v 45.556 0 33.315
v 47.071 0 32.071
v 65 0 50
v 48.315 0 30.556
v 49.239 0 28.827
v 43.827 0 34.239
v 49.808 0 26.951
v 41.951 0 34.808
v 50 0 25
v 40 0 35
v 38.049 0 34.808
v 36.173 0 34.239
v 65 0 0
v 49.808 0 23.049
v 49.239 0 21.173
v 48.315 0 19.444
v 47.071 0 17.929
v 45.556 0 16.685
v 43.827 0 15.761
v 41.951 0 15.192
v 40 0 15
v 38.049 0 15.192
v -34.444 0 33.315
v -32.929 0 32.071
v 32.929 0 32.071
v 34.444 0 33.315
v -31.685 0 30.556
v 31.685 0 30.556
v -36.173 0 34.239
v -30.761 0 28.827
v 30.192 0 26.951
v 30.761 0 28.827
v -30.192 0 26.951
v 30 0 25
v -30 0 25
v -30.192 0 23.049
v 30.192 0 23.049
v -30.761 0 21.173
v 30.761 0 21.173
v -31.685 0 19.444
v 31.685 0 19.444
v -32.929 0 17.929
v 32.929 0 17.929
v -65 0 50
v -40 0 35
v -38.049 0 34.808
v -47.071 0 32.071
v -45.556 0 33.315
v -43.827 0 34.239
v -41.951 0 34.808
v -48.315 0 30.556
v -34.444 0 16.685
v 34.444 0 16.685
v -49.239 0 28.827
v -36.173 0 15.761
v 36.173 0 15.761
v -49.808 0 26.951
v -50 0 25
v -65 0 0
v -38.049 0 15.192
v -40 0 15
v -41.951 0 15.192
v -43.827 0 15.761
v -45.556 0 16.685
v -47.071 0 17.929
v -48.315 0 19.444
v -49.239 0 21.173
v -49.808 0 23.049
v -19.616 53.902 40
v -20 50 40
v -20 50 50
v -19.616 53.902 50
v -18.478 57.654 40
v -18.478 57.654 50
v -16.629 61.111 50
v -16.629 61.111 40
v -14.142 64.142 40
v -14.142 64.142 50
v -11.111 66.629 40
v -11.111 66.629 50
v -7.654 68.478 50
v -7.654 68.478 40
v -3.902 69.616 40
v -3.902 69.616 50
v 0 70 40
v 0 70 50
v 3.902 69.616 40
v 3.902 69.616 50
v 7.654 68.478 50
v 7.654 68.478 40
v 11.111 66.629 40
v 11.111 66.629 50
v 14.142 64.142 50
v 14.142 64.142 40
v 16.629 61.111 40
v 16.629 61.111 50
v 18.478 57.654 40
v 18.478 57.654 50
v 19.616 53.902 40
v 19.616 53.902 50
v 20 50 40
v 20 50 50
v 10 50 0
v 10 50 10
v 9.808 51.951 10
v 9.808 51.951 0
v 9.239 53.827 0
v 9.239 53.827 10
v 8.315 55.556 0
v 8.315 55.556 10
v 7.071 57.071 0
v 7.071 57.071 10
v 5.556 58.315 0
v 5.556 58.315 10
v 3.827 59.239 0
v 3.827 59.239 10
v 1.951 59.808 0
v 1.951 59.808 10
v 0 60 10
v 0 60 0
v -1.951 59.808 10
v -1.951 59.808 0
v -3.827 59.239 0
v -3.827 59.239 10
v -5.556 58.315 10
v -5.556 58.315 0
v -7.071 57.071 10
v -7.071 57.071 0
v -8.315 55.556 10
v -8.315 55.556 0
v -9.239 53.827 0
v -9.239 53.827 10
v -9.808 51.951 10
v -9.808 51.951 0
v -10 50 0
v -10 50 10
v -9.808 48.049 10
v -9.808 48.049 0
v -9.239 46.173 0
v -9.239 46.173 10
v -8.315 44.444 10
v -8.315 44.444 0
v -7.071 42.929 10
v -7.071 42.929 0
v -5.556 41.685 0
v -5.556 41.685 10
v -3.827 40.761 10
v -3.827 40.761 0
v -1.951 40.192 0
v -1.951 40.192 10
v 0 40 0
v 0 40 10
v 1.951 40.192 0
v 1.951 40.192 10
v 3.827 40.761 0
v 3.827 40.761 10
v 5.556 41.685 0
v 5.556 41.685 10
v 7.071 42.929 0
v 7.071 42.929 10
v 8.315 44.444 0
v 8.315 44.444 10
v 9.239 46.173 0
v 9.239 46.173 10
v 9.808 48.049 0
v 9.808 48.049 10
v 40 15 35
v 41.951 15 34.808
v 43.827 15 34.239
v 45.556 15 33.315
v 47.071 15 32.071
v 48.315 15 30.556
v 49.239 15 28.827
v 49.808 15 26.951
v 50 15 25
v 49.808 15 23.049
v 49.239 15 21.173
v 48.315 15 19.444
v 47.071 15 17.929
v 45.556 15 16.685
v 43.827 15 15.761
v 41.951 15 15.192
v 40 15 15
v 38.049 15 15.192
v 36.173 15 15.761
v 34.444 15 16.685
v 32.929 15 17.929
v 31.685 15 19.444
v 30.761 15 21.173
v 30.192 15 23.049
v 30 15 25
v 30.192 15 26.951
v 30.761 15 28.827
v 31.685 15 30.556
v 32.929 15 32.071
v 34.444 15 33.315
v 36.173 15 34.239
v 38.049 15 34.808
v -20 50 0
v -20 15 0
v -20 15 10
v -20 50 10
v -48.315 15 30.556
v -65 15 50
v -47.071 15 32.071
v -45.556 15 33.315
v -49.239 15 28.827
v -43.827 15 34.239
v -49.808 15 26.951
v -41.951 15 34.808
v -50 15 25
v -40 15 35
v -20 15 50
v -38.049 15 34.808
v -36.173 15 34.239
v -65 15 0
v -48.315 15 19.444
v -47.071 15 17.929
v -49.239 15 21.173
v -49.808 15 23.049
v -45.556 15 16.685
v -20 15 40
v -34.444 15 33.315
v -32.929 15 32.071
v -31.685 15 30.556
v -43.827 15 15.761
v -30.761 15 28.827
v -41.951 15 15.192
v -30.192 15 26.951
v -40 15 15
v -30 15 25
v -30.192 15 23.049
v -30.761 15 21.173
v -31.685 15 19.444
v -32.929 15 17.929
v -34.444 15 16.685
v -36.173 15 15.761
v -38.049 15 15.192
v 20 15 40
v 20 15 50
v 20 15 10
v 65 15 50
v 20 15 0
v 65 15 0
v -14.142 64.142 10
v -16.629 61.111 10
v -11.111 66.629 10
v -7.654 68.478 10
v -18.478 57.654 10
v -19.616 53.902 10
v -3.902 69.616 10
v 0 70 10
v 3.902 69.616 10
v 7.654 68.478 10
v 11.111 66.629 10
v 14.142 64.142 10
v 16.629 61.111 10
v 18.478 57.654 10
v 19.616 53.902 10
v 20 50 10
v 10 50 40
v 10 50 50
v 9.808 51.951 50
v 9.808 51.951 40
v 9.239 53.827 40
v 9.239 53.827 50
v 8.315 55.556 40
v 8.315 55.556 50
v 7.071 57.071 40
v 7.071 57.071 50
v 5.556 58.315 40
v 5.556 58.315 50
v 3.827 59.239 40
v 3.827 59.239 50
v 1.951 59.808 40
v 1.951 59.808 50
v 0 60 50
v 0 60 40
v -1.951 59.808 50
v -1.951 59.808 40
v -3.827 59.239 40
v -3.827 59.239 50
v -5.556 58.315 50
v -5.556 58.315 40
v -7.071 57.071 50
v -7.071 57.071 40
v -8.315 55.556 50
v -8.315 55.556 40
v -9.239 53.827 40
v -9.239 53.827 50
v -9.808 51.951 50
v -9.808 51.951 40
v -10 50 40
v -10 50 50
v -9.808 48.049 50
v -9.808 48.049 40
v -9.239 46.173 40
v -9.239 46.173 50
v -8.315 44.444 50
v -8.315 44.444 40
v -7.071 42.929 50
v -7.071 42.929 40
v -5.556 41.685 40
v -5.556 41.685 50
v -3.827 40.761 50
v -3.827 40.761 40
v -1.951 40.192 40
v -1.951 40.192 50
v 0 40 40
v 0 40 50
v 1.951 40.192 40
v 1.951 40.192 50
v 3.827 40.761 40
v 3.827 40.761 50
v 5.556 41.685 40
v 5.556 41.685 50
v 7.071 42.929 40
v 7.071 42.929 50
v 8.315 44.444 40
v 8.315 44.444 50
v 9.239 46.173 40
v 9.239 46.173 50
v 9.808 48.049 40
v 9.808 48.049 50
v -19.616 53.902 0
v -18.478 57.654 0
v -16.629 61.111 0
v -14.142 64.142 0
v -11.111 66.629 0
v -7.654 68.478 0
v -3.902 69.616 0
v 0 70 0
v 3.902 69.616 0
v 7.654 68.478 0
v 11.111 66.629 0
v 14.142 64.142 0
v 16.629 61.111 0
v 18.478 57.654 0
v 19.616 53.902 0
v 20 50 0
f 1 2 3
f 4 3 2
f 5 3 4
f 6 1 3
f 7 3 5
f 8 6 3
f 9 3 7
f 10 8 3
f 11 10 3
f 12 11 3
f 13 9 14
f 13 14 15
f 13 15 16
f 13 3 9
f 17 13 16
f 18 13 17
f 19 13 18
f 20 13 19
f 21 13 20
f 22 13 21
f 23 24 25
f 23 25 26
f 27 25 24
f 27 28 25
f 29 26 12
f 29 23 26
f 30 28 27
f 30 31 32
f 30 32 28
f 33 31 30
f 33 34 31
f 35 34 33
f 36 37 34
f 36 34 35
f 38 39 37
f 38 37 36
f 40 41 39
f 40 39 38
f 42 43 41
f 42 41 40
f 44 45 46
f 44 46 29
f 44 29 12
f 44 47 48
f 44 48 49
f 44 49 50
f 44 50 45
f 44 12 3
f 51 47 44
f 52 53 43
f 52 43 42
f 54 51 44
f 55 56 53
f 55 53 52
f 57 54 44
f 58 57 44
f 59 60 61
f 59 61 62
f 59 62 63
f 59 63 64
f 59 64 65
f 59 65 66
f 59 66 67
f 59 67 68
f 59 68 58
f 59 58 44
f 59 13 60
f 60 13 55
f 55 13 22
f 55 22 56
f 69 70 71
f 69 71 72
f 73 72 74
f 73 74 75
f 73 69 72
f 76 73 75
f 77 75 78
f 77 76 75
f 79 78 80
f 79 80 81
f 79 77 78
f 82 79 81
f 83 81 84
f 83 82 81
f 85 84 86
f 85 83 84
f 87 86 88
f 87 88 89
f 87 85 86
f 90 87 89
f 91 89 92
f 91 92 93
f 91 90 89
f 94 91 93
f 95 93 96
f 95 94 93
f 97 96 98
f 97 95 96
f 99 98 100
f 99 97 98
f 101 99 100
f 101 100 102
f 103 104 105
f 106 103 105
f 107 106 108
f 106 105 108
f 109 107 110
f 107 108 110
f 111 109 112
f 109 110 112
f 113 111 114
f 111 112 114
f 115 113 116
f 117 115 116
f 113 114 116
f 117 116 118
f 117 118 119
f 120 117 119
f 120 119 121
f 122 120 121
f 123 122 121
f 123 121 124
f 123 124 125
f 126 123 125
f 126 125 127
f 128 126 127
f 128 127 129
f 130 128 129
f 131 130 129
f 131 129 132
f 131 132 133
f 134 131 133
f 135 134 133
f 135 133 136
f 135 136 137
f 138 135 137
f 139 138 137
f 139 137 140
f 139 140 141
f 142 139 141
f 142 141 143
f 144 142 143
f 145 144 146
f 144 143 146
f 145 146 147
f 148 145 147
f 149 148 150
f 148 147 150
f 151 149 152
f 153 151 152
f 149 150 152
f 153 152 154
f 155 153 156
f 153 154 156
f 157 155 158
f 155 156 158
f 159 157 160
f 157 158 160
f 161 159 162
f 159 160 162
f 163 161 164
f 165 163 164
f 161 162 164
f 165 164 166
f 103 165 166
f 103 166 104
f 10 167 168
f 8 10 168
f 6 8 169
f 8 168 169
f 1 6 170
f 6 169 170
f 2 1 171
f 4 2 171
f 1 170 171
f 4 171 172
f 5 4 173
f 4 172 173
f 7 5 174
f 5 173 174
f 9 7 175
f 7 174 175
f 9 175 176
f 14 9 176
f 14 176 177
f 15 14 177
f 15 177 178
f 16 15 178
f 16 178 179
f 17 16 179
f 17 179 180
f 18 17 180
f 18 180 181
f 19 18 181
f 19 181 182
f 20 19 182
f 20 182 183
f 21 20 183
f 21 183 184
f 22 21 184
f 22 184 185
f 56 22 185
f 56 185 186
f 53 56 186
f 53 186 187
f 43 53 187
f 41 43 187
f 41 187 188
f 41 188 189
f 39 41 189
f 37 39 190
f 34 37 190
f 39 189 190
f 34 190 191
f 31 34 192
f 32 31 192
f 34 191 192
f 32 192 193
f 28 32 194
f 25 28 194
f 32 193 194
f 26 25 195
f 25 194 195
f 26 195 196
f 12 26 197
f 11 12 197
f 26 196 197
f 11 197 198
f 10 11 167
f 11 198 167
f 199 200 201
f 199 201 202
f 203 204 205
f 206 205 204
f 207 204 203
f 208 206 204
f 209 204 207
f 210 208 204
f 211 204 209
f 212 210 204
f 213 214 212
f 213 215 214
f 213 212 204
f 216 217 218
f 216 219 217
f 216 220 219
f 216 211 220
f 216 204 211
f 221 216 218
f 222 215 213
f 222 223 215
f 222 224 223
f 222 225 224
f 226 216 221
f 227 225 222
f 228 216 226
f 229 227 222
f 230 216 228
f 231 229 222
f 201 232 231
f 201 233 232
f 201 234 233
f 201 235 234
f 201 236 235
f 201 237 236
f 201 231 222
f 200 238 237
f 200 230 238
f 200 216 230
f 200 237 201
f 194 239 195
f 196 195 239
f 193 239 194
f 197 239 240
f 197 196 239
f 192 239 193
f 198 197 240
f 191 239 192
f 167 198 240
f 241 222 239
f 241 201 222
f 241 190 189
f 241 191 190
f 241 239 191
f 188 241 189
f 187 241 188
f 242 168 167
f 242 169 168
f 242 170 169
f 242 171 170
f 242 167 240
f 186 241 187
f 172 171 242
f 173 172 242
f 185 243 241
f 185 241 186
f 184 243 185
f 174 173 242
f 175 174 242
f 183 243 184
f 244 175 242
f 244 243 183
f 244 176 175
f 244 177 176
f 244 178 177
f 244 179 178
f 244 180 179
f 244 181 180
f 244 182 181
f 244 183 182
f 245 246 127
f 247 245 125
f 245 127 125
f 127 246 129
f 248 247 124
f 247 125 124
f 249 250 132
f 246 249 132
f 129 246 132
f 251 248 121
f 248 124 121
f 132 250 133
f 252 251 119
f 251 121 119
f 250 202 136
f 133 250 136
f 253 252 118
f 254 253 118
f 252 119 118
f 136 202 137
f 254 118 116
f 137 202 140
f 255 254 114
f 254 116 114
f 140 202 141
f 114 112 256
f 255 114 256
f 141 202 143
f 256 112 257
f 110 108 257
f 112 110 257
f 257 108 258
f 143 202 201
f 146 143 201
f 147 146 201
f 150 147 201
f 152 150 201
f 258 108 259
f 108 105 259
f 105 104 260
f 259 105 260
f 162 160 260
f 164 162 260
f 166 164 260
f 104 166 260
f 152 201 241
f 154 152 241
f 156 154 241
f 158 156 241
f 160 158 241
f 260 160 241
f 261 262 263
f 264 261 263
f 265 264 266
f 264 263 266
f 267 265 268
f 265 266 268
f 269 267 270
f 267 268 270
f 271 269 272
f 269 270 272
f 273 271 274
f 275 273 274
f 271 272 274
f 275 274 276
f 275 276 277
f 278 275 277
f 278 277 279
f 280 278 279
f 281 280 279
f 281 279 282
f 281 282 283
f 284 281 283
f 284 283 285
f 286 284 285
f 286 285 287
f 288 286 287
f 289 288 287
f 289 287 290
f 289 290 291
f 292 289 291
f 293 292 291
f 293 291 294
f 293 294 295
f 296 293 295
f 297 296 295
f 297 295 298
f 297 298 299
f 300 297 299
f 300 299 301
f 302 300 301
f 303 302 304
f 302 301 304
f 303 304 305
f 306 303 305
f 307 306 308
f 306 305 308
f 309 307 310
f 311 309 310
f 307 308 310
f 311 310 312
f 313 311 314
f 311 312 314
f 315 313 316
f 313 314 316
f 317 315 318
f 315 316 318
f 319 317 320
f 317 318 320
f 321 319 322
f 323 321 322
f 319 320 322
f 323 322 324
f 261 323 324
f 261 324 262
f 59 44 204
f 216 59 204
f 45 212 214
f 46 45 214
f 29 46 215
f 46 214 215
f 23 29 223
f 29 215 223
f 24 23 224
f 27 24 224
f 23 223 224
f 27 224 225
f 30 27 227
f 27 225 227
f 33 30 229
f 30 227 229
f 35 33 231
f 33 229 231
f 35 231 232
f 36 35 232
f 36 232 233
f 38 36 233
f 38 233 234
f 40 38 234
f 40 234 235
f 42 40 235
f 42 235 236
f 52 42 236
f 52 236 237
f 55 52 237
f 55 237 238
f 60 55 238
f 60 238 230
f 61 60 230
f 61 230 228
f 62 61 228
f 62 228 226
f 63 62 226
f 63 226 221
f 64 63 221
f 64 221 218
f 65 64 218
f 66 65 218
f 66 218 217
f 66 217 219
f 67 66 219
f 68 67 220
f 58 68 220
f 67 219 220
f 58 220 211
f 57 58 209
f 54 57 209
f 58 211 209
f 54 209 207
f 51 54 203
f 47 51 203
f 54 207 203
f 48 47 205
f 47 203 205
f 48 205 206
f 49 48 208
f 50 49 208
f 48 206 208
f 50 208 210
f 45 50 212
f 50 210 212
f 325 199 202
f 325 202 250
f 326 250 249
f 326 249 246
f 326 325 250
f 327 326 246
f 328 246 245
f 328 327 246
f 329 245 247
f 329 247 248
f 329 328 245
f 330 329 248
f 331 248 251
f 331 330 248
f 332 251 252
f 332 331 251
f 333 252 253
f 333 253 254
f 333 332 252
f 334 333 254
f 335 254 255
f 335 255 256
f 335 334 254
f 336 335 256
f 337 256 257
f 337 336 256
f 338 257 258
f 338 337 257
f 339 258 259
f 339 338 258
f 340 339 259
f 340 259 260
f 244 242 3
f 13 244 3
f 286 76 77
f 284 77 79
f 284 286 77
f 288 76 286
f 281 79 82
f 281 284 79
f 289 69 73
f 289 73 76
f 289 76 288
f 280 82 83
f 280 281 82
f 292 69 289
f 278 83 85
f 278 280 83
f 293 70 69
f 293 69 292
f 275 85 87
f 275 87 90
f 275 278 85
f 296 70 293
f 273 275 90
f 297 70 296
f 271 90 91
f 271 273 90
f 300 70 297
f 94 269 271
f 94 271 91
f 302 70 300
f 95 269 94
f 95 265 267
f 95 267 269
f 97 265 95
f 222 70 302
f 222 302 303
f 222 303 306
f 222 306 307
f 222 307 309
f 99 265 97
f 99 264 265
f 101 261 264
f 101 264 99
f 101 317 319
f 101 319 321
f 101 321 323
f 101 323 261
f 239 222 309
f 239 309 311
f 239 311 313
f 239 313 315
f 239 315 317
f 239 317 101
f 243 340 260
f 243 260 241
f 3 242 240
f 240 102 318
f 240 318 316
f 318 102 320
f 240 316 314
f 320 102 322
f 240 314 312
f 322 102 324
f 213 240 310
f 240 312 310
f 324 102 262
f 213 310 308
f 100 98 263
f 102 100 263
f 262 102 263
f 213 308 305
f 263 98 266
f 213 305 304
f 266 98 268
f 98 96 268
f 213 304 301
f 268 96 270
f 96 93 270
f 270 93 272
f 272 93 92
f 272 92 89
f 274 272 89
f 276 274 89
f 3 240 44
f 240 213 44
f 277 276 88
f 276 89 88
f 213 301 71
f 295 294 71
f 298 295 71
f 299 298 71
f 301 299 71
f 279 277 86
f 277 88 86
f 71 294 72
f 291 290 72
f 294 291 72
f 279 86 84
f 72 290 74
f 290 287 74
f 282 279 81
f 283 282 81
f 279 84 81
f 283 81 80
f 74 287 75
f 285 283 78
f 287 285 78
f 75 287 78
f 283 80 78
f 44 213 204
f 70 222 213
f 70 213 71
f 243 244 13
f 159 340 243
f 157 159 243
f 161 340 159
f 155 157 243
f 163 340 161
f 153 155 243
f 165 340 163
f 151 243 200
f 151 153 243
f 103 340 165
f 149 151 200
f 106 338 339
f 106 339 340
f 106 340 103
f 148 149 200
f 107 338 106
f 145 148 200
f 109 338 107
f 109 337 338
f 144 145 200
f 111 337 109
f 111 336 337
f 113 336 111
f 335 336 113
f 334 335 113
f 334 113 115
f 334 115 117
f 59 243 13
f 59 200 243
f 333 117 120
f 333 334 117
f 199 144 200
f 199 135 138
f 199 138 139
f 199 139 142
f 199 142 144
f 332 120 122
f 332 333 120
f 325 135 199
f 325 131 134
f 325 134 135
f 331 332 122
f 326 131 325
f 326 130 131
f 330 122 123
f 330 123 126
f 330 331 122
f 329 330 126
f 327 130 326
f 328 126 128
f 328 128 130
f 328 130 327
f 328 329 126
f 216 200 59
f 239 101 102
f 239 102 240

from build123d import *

# Parameters (mm, degrees)
BOSS_EXTRUDE1_DEPTH = 50
SKETCH2_R           = 10
CUT_EXTRUDE1_DEPTH  = 25
SKETCH2_3_R         = 10
CUT_EXTRUDE2_DEPTH  = 25
SKETCH3_W           = 40
SKETCH3_H           = 30
CUT_EXTRUDE3_DEPTH  = 99.742088291
SKETCH4_R           = 10
CUT_EXTRUDE4_DEPTH  = 108.819293264


with BuildPart() as part:
    # Sketch1 → Boss-Extrude1 (new body)
    with BuildSketch(Plane.XY):
        with BuildLine():
            Line((-65, 0), (-65, 15))
            Line((-65, 15), (-20, 15))
            Line((-20, 15), (-20, 50))
            ThreePointArc((-20, 50), (0, 70), (20, 50))
            Line((20, 50), (20, 15))
            Line((20, 15), (65, 15))
            Line((65, 15), (65, 0))
            Line((65, 0), (-65, 0))
        make_face()
    extrude(amount=BOSS_EXTRUDE1_DEPTH)

    # Sketch2 → Cut-Extrude1 (cut)
    with BuildSketch(Plane(origin=(0, 15, 0), x_dir=(1, 0, 0), z_dir=(0, 1, 0))):
        with Locations((-40, -25)):
            Circle(SKETCH2_R)
    extrude(amount=-CUT_EXTRUDE1_DEPTH, mode=Mode.SUBTRACT)

    # Sketch2<3> → Cut-Extrude2 (cut)
    with BuildSketch(Plane(origin=(0, 15, 0), x_dir=(1, 0, 0), z_dir=(0, 1, 0))):
        with Locations((40, -25)):
            Circle(SKETCH2_3_R)
    extrude(amount=-CUT_EXTRUDE2_DEPTH, mode=Mode.SUBTRACT)

    # Sketch3 → Cut-Extrude3 (cut, through all)
    with BuildSketch(Plane(origin=(0, 15, 0), x_dir=(1, 0, 0), z_dir=(0, 1, 0))):
        with Locations((0, -25)):
            Rectangle(SKETCH3_W, SKETCH3_H)
    extrude(amount=CUT_EXTRUDE3_DEPTH, mode=Mode.SUBTRACT)

    # Sketch4 → Cut-Extrude4 (cut, through all)
    with BuildSketch(Plane.XY.offset(50)):
        with Locations((0, 50)):
            Circle(SKETCH4_R)
    extrude(amount=-CUT_EXTRUDE4_DEPTH, mode=Mode.SUBTRACT)


solid = part.part
